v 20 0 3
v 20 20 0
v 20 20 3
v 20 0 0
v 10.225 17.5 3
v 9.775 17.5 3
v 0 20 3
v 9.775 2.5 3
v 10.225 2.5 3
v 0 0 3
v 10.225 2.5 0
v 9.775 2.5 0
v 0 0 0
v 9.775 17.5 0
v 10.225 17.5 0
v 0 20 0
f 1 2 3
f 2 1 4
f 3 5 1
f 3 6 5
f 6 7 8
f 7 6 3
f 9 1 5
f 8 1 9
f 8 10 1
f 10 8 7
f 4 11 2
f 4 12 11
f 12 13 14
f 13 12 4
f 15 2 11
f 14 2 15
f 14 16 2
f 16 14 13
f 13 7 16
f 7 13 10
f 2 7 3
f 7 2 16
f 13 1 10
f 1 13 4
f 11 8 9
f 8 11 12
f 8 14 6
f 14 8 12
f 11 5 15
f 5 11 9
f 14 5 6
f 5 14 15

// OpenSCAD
difference() {
	cube([20, 20, 3]);
	translate([10, 10, 1.5]) {
		rotate([0, 0, 90]) {
			cube([15, 0.45, 5], center=true);
		}
	}
}
